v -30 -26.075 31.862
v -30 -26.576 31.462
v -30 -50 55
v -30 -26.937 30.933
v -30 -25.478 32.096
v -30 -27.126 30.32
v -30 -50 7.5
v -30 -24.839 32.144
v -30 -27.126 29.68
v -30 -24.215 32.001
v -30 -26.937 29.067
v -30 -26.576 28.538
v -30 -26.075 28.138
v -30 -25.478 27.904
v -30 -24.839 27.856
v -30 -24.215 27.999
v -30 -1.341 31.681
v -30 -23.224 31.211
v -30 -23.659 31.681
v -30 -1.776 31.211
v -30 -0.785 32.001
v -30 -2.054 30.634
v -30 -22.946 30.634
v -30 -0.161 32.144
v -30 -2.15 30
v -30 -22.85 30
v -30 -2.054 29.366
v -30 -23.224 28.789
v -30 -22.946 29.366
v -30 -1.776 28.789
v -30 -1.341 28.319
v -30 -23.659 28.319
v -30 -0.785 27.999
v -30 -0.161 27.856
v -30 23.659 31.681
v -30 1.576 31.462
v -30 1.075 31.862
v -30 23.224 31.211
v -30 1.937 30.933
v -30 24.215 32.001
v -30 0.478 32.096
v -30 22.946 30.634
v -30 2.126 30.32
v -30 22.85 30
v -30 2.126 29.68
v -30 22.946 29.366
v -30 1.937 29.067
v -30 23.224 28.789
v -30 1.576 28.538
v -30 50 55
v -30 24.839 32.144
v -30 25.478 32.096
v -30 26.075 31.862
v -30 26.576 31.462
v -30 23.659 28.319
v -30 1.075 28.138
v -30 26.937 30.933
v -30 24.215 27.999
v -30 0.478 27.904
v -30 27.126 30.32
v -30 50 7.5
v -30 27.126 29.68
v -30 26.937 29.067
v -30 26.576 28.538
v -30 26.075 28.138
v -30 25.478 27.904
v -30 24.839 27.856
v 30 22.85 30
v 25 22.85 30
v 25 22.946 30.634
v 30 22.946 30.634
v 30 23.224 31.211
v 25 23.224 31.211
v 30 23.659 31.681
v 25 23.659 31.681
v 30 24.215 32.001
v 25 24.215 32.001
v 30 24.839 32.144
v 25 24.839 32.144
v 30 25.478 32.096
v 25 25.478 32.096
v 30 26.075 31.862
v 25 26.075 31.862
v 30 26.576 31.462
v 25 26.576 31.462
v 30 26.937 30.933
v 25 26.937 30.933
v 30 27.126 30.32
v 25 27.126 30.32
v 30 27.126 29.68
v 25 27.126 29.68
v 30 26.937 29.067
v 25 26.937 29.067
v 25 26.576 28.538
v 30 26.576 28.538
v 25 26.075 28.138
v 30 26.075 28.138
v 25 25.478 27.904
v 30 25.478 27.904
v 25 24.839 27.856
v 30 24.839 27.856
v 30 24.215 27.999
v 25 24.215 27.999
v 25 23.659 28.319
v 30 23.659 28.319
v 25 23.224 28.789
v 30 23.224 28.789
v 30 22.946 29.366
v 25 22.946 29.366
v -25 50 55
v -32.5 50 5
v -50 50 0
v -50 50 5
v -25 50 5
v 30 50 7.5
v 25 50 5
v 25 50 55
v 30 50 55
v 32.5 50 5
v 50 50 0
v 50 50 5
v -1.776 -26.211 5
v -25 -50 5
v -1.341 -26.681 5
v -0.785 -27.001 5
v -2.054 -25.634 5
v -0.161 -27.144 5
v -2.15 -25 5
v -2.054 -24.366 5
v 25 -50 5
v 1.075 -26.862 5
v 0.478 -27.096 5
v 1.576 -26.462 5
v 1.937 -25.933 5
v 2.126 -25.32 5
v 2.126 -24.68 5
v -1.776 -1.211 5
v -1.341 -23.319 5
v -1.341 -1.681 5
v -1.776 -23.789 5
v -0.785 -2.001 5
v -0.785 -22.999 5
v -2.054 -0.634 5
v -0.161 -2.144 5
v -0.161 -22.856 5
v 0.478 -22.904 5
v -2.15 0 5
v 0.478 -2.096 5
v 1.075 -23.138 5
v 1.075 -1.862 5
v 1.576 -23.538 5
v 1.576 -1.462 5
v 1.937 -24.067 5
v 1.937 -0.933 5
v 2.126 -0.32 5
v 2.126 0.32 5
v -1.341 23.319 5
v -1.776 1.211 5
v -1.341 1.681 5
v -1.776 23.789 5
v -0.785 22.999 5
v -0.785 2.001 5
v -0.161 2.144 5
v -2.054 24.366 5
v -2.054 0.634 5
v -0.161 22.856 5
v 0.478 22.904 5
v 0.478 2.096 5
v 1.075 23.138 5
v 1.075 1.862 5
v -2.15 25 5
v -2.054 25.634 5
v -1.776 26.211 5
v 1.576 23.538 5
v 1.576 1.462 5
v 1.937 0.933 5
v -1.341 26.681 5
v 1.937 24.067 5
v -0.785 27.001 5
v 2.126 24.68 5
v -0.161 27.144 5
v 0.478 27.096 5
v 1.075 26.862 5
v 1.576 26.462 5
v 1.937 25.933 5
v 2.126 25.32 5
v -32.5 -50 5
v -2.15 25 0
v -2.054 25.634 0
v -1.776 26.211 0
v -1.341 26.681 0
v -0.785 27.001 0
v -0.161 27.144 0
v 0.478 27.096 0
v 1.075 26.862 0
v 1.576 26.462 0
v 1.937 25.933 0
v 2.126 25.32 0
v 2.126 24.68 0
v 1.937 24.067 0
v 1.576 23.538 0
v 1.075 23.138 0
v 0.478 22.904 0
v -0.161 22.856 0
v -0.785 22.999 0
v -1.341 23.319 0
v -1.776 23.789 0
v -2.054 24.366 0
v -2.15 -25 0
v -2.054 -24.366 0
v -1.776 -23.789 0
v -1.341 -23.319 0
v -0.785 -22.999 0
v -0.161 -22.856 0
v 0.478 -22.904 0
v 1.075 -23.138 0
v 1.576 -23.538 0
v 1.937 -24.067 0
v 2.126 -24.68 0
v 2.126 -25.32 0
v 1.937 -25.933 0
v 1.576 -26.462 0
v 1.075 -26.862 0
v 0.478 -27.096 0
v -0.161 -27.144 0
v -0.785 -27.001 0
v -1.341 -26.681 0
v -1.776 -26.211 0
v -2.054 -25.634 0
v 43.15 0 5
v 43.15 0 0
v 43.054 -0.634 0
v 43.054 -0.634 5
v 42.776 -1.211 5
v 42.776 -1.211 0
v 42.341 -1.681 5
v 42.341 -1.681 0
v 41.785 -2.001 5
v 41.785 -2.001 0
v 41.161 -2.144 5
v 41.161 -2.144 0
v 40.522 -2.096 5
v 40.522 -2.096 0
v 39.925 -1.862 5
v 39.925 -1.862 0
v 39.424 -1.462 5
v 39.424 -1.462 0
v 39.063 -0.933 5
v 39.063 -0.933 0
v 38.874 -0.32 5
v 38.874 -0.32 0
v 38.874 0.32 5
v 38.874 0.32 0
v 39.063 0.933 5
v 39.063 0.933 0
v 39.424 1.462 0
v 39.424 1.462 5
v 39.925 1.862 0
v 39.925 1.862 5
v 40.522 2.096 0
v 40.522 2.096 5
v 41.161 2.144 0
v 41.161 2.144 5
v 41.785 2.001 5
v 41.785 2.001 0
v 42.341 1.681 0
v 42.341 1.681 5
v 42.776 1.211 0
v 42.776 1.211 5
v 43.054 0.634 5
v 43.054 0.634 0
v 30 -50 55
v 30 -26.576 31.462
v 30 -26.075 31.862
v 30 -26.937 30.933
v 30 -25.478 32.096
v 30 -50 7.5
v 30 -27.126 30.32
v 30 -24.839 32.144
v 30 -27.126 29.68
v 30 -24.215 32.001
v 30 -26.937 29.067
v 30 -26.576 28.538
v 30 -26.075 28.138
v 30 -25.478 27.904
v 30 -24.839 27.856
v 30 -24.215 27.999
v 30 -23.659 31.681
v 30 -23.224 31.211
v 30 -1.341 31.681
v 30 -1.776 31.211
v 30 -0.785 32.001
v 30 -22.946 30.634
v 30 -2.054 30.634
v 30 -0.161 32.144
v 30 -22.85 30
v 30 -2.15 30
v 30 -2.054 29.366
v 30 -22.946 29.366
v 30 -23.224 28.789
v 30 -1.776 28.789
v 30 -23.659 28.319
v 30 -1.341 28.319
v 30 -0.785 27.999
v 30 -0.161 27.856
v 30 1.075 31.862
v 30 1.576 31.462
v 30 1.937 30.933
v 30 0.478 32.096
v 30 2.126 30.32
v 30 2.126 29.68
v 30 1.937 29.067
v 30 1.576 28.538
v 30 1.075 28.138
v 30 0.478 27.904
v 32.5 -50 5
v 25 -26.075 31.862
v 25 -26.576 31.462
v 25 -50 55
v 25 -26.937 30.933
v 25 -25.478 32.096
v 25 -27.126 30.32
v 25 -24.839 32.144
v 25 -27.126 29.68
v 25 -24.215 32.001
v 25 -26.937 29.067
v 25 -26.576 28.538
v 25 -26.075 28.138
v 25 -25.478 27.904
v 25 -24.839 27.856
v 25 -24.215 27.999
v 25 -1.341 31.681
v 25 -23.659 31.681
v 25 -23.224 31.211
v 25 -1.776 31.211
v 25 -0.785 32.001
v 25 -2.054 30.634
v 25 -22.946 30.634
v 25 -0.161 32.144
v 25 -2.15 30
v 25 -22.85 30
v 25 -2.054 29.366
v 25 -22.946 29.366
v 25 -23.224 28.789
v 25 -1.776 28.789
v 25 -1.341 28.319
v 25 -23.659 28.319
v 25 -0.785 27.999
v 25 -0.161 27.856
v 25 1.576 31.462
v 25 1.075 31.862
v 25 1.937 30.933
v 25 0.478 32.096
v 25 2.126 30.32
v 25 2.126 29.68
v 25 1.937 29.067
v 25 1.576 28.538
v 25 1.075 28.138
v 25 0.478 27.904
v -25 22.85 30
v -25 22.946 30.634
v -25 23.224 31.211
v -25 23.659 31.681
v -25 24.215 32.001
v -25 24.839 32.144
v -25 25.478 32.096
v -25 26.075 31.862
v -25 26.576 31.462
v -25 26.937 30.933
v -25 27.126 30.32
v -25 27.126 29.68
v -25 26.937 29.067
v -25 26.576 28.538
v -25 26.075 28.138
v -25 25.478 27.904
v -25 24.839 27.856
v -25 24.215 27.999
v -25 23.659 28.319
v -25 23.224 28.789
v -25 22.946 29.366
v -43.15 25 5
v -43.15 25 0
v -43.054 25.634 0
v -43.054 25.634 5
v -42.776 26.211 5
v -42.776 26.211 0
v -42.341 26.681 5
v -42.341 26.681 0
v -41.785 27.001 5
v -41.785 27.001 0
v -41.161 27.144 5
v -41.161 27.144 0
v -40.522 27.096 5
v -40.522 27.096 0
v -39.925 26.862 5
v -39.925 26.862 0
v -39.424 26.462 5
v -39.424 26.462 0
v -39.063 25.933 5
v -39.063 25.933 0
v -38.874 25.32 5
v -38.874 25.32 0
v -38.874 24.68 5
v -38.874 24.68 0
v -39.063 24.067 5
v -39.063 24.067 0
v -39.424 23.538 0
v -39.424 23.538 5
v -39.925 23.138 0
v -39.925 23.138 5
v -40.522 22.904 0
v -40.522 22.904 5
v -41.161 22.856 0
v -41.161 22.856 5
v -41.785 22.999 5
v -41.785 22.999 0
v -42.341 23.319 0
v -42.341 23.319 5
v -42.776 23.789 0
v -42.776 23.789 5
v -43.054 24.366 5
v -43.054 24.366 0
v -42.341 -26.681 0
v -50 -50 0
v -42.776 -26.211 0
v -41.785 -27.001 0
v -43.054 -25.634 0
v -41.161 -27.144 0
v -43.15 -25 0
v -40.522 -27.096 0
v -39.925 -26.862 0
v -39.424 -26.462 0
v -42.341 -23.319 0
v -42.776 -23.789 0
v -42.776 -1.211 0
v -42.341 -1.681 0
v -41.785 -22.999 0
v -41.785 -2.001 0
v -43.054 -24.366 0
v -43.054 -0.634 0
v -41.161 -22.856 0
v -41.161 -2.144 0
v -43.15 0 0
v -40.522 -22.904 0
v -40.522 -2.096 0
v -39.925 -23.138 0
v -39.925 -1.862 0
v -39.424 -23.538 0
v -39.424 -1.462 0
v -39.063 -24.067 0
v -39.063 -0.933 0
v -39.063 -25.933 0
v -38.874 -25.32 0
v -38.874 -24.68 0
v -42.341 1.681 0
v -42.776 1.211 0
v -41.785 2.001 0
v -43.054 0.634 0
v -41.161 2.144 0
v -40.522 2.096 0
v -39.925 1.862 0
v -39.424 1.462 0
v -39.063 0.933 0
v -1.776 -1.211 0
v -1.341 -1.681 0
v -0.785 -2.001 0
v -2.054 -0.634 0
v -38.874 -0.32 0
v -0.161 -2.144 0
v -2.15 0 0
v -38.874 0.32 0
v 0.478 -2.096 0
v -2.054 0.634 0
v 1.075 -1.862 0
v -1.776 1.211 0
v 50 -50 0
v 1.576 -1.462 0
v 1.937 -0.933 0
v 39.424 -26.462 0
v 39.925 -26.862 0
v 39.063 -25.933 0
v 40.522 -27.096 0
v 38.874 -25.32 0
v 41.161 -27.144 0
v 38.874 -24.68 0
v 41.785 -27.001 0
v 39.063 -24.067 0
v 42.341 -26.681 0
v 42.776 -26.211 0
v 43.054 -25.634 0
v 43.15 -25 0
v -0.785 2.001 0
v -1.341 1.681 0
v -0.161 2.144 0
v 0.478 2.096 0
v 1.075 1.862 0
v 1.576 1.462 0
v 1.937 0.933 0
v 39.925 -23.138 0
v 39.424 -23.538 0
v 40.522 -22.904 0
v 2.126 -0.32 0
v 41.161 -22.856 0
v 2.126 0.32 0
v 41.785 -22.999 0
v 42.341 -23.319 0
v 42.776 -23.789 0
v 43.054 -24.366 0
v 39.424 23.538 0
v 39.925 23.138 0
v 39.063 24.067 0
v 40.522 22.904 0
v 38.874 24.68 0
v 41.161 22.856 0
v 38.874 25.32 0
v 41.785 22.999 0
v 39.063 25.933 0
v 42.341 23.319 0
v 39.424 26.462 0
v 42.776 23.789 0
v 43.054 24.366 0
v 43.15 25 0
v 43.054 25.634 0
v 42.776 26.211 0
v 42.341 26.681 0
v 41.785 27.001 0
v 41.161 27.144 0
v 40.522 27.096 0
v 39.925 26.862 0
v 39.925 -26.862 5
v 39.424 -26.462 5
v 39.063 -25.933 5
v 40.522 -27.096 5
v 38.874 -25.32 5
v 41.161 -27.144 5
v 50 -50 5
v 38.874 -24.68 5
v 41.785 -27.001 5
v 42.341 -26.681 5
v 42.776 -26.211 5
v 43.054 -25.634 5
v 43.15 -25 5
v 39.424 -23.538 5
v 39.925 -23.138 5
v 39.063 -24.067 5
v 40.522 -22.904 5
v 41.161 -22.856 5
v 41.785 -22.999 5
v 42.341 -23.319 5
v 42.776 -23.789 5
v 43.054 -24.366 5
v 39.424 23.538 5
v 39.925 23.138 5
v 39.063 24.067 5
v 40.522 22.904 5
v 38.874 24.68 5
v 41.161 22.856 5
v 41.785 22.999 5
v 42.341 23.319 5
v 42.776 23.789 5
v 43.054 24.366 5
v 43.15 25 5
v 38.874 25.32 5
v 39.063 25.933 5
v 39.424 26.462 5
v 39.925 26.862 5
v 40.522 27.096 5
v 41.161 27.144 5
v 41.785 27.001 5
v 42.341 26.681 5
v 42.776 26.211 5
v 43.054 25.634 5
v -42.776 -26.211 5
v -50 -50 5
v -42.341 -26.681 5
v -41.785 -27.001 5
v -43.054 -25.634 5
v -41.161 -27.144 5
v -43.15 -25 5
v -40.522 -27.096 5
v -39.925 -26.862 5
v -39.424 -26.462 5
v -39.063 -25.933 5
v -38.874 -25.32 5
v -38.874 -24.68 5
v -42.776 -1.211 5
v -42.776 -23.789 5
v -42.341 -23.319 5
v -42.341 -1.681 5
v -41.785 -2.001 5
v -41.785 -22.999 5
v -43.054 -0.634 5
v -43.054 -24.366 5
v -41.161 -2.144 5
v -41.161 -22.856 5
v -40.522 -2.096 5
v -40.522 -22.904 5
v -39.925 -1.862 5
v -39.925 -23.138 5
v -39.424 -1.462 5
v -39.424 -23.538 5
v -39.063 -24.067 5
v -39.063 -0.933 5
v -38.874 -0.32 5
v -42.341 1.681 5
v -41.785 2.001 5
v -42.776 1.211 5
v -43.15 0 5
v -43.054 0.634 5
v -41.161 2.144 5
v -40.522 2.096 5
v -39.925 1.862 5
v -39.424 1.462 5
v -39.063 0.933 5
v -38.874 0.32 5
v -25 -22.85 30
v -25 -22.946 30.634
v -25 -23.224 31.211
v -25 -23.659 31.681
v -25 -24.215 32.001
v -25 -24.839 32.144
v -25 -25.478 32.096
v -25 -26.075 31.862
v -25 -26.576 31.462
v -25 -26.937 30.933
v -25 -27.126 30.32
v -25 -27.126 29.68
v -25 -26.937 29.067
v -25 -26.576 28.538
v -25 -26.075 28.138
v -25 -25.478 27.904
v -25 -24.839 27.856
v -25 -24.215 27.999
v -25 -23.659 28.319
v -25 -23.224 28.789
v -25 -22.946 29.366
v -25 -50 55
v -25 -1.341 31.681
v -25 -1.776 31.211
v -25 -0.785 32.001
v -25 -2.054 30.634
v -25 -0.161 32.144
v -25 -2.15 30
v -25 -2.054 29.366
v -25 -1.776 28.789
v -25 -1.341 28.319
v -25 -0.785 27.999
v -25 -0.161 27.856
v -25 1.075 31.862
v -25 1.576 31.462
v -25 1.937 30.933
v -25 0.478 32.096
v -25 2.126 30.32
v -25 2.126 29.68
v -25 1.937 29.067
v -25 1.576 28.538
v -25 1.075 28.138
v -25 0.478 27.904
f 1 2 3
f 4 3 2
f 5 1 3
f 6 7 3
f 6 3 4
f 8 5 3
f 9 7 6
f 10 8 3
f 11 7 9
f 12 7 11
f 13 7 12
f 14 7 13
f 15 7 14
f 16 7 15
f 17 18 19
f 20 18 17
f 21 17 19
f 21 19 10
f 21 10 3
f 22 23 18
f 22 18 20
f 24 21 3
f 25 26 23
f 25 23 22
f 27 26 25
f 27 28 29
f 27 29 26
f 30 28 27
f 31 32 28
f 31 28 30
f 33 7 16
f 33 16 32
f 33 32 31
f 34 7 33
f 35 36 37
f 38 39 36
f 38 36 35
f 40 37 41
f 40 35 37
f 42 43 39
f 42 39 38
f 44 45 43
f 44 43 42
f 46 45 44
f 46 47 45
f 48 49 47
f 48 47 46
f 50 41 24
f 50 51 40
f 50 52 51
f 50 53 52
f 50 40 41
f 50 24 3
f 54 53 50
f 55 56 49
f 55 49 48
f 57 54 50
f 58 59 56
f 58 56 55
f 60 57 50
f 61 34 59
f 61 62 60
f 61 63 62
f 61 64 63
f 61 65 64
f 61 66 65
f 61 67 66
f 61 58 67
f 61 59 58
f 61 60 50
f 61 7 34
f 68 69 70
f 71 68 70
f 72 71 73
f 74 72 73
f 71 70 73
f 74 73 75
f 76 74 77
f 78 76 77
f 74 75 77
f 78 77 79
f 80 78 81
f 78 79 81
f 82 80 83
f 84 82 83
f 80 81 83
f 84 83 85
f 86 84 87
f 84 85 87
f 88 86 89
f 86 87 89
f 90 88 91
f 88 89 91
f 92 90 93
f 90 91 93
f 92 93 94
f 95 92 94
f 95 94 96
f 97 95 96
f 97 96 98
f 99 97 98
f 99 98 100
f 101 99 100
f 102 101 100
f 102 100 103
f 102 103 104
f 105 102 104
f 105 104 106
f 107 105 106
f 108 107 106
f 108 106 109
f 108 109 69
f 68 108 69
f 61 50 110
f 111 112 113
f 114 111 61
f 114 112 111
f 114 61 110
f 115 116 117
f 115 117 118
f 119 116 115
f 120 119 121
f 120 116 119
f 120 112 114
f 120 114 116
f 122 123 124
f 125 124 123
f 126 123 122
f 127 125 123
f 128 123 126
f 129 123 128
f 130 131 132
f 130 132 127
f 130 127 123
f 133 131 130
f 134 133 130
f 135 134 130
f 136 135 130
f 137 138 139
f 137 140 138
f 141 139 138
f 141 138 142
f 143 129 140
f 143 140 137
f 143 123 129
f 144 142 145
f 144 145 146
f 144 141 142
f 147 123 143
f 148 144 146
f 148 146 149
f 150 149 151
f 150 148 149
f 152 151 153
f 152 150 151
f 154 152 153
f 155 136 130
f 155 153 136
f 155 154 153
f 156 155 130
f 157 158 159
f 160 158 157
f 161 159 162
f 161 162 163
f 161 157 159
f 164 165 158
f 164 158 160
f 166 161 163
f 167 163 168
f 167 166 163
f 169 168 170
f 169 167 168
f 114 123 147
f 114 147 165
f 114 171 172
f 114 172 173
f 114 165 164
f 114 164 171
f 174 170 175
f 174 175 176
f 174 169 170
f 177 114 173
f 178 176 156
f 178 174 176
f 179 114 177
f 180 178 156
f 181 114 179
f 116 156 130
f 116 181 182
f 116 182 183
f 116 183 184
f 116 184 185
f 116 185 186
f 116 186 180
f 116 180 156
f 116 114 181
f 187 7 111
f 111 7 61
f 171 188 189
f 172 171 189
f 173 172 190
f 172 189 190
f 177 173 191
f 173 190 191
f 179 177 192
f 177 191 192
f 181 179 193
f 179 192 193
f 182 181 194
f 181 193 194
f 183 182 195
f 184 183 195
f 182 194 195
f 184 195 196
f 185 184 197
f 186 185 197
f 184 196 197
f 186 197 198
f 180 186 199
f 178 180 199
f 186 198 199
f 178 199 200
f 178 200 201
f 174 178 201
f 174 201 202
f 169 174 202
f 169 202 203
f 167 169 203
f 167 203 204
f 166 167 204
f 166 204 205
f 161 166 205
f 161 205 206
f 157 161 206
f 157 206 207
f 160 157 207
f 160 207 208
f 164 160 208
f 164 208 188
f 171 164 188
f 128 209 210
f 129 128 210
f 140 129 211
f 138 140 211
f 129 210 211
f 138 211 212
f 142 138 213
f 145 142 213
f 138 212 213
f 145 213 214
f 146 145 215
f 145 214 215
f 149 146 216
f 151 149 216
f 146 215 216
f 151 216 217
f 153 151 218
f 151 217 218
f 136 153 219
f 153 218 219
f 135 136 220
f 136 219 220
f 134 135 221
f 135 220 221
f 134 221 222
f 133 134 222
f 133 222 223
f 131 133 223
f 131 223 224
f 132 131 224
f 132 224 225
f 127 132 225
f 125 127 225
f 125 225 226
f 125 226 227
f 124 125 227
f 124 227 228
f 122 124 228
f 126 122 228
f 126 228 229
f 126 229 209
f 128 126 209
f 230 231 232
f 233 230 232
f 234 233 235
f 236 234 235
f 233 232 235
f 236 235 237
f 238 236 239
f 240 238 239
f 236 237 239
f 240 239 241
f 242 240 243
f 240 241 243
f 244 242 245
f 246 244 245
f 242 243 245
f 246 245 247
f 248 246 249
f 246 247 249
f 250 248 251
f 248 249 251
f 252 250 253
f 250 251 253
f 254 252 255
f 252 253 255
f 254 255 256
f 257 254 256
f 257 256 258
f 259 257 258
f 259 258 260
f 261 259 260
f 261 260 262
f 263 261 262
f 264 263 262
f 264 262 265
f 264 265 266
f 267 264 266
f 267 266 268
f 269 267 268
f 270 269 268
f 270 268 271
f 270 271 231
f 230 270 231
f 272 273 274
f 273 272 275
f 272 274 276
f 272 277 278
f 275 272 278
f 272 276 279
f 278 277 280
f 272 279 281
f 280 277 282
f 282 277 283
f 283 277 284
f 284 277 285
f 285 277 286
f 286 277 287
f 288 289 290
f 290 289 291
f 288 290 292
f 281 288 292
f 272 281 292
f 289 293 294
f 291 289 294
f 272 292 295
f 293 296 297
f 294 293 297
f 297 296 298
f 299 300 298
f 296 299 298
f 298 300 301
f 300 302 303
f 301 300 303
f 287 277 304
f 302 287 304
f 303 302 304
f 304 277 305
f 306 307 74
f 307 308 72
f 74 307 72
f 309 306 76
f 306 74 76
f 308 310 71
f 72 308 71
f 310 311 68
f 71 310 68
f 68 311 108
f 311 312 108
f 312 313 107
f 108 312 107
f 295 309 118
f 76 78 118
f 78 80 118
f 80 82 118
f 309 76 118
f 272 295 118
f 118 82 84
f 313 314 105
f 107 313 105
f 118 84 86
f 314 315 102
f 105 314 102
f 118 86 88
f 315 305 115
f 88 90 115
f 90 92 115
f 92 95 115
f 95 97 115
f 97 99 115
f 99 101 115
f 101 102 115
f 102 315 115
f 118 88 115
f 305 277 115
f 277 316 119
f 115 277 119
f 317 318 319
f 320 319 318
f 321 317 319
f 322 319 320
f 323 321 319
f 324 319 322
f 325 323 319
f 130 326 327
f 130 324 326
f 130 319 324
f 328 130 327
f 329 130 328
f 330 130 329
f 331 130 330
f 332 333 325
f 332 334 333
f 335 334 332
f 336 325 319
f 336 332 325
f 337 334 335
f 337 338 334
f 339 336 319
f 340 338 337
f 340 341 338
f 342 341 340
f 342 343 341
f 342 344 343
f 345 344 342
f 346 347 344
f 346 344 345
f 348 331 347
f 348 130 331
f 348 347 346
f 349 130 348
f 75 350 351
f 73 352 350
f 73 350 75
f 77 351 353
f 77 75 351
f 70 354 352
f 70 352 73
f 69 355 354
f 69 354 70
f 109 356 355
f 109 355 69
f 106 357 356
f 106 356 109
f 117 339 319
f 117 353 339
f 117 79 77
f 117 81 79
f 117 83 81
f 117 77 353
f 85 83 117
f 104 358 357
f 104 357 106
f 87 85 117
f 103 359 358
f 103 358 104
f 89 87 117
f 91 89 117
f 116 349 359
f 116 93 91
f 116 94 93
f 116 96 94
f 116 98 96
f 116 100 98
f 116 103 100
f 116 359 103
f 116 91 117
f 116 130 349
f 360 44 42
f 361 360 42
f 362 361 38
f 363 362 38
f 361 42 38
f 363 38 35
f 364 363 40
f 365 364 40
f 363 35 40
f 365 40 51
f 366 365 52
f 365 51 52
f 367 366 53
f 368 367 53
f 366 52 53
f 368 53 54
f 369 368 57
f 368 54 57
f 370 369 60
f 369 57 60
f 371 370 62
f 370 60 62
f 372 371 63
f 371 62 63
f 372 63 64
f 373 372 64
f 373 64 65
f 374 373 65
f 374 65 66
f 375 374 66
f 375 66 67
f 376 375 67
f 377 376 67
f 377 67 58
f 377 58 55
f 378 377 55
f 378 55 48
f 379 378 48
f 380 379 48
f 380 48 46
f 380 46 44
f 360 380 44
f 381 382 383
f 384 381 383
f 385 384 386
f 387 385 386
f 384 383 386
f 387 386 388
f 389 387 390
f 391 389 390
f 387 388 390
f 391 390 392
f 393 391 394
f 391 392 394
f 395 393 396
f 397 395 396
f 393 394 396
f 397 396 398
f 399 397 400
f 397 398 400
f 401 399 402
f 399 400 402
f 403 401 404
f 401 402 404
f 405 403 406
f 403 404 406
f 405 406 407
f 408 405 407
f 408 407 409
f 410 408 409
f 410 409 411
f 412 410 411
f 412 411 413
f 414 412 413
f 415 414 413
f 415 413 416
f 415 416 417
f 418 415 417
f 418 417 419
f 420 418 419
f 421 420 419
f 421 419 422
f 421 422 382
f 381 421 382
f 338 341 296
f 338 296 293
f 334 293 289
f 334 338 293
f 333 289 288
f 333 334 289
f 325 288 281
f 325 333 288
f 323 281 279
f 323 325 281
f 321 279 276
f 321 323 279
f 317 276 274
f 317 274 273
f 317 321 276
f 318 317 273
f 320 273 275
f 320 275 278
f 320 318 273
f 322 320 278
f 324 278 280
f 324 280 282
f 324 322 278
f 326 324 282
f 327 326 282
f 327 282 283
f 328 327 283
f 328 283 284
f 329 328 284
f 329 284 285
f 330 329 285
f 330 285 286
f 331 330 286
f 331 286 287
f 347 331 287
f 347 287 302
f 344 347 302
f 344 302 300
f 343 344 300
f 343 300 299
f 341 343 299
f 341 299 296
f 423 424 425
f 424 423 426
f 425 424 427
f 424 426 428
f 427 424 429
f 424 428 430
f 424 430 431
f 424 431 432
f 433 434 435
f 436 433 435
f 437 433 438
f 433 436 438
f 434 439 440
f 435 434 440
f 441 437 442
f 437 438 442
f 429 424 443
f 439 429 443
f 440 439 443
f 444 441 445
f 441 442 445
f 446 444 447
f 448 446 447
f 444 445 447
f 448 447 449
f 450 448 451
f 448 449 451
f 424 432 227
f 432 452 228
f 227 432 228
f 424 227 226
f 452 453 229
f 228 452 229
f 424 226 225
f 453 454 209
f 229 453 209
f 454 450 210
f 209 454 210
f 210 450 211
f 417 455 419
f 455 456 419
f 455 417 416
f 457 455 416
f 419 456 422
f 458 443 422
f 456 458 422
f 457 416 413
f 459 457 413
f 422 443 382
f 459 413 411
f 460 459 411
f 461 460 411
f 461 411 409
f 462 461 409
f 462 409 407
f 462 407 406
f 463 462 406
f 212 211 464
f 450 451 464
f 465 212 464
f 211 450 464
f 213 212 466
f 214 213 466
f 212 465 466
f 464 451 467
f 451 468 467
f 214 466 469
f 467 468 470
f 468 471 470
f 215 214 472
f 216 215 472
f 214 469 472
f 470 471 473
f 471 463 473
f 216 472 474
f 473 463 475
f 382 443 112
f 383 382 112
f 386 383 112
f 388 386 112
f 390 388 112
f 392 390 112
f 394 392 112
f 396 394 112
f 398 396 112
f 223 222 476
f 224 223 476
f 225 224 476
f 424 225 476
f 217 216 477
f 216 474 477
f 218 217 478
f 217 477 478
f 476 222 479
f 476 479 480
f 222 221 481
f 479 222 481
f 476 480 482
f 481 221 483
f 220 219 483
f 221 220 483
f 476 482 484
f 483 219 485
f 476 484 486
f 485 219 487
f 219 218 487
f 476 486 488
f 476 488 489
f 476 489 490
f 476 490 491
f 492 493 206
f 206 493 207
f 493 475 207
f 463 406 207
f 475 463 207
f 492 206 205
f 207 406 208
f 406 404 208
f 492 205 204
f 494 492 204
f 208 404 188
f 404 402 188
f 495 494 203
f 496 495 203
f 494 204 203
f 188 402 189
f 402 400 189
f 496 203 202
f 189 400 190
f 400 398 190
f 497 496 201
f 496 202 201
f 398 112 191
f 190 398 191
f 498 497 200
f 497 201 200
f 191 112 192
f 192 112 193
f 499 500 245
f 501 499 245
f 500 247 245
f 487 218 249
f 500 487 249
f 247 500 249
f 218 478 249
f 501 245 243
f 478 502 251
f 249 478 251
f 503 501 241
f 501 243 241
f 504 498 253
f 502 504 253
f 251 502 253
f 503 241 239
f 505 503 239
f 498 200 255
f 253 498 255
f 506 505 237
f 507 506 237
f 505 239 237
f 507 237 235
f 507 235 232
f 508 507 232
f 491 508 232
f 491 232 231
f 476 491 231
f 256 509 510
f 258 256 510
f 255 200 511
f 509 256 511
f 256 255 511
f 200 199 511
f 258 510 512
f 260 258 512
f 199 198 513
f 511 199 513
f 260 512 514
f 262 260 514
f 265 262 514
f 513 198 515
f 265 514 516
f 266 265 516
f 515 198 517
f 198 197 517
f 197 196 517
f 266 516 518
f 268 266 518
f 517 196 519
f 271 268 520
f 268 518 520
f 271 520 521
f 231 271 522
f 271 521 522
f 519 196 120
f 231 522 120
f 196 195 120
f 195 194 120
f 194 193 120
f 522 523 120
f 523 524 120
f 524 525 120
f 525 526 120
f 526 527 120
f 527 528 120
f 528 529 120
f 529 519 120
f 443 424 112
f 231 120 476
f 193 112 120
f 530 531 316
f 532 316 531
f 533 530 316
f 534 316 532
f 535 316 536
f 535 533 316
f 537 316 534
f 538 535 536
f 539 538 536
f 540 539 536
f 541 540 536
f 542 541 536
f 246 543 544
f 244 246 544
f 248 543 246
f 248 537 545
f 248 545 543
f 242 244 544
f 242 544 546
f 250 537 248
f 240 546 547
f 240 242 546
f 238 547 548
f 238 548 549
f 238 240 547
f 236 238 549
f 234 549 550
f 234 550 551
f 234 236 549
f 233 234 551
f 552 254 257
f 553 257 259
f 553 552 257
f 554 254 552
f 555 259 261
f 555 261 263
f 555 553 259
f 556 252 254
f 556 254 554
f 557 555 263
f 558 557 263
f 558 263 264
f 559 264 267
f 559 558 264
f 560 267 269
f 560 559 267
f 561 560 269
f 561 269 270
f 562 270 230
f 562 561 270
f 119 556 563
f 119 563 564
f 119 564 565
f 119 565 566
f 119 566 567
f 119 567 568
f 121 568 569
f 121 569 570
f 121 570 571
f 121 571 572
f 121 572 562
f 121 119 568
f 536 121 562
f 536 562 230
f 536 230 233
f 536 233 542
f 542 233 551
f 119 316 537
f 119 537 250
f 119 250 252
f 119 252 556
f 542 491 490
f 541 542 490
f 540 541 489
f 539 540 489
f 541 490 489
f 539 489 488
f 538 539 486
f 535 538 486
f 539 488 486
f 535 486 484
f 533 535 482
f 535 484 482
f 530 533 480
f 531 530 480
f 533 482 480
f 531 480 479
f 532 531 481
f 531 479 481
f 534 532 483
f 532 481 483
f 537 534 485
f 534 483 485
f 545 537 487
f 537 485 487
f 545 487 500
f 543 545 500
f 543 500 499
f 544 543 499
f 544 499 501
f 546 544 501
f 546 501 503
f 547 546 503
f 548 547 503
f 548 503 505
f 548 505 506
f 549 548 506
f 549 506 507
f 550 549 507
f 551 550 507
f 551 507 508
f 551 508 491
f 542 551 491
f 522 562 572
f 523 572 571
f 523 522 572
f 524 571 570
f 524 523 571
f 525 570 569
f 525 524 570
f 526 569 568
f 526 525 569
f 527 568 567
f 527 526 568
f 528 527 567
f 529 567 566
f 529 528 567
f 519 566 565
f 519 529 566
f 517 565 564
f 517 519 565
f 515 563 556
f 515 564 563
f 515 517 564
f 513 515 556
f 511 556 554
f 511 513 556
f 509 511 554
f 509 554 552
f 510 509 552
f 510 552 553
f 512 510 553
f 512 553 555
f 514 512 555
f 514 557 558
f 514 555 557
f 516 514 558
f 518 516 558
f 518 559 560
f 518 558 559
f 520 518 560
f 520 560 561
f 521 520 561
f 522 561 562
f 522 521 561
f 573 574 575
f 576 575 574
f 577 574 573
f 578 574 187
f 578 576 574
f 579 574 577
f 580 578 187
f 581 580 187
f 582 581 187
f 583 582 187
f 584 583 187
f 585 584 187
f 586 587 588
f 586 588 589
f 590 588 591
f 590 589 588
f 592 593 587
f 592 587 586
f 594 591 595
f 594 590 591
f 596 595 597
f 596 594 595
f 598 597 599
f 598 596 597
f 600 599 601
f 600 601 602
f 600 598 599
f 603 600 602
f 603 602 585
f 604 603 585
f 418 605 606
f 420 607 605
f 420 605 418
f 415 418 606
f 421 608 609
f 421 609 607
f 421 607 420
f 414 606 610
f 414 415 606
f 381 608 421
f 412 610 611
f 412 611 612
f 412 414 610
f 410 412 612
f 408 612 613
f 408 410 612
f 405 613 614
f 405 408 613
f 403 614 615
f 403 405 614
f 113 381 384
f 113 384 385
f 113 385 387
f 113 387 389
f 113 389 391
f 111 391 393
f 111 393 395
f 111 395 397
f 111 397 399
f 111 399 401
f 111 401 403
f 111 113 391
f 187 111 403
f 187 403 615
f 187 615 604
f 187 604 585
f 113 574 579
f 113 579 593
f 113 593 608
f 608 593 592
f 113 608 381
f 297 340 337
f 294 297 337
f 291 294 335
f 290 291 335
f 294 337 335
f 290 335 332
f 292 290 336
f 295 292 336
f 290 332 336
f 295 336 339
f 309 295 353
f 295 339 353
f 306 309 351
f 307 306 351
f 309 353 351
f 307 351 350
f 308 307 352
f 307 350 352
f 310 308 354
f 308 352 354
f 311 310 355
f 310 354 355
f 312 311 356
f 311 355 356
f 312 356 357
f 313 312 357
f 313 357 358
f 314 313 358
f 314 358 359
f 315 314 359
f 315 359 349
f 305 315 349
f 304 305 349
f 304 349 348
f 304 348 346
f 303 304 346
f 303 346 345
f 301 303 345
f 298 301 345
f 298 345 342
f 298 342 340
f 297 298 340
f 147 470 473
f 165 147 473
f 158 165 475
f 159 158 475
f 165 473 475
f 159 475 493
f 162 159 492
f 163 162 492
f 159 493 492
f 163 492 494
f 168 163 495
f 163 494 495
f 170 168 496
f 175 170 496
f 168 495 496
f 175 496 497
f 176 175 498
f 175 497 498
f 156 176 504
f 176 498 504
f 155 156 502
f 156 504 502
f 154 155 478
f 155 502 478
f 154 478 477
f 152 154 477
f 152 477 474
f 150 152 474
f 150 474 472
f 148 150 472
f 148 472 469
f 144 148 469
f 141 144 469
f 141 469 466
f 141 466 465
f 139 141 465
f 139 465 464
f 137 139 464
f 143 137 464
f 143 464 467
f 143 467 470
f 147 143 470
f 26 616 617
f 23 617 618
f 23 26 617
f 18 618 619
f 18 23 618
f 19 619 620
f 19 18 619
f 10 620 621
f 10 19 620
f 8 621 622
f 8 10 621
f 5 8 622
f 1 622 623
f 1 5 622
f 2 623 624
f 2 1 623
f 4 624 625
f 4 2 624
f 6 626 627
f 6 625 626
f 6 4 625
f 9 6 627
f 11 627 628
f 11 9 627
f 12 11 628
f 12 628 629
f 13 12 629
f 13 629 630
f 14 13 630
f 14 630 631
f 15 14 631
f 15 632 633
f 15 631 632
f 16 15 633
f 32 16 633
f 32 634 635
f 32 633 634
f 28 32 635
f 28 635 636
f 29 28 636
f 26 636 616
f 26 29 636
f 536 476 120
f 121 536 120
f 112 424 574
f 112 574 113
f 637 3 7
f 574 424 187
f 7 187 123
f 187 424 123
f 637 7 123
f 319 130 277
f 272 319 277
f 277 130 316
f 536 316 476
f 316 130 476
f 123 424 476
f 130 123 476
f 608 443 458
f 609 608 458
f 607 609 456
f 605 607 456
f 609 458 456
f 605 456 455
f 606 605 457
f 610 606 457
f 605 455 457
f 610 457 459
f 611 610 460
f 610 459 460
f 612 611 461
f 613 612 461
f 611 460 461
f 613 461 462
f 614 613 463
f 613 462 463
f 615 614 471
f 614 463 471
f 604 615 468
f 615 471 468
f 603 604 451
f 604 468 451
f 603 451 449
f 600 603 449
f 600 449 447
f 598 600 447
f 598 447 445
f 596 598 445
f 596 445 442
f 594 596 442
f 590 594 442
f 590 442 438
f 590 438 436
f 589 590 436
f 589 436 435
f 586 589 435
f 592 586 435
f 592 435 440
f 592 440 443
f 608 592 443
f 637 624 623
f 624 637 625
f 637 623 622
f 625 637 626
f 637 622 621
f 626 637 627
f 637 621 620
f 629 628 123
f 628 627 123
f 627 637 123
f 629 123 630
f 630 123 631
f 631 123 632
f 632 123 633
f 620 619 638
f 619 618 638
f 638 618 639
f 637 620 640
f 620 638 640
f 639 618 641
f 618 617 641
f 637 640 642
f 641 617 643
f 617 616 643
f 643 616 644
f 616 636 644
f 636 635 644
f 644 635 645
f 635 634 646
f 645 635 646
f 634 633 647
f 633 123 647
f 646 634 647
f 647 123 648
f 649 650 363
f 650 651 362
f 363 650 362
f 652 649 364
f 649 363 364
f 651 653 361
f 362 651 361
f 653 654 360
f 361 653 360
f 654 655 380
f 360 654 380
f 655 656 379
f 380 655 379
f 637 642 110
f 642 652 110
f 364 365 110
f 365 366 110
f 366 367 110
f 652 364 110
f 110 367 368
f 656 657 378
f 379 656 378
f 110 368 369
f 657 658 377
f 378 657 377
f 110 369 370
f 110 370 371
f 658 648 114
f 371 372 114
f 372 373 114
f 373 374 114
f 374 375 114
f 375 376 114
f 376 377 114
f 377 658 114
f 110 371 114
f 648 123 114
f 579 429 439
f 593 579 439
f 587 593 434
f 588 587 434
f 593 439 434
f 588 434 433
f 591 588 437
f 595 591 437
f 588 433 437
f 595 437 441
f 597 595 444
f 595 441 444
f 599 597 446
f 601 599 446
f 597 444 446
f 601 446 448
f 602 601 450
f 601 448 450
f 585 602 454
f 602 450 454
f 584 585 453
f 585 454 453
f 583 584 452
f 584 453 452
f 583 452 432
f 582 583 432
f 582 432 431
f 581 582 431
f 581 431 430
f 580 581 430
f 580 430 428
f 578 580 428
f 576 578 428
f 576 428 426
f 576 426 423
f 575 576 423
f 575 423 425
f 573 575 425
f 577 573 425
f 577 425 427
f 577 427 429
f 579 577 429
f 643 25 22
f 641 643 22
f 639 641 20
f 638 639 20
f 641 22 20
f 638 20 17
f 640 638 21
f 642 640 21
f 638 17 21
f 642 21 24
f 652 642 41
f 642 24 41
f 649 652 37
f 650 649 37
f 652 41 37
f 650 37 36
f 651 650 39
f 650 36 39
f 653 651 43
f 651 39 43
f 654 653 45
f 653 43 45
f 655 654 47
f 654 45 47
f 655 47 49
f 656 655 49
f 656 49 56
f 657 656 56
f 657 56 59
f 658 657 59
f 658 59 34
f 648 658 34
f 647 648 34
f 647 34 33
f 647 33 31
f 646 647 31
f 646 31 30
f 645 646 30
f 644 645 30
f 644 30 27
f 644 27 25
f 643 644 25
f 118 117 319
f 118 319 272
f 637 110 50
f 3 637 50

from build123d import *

# Parameters (mm, degrees)
SKETCH1_W               = 100
SKETCH1_H               = 100
BOSS_EXTRUDE1_DEPTH     = 5
SKETCH2_W               = 5
SKETCH2_H               = 100
BOSS_EXTRUDE2_DEPTH     = 50
SKETCH3_R               = 2.15
CUT_EXTRUDE1_DEPTH      = 10
LPATTERN1_COUNT         = 3
LPATTERN1_PITCH         = 25
MIRROR2_COPY_1_SKETCH_R = 2.15
MIRROR2_COPY_1_DEPTH    = 10
MIRROR2_COPY_2_SKETCH_R = 2.15
MIRROR2_COPY_2_DEPTH    = 10
MIRROR3_COPY_1_SKETCH_R = 2.15
MIRROR3_COPY_1_DEPTH    = 10
MIRROR3_COPY_2_SKETCH_R = 2.15
MIRROR3_COPY_2_DEPTH    = 10
MIRROR3_COPY_3_SKETCH_R = 2.15
MIRROR3_COPY_3_DEPTH    = 10
MIRROR3_COPY_4_SKETCH_R = 2.15
MIRROR3_COPY_4_DEPTH    = 10
CHAMFER1_SIZE           = 2.5
SKETCH7_R               = 2.15
CUT_EXTRUDE2_DEPTH      = 60
SKETCH8_R               = 2.15
CUT_EXTRUDE3_DEPTH      = 60


with BuildPart() as part:
    # Sketch1 → Boss-Extrude1 (new body)
    with BuildSketch(Plane.XY):
        Rectangle(SKETCH1_W, SKETCH1_H)
    extrude(amount=BOSS_EXTRUDE1_DEPTH)

    # Sketch2 → Boss-Extrude2 (add)
    with BuildSketch(Plane.XY.offset(5)):
        with Locations((27.5, 0)):
            Rectangle(SKETCH2_W, SKETCH2_H)
    boss_extrude2 = extrude(amount=BOSS_EXTRUDE2_DEPTH)

    # Sketch3 → Cut-Extrude1 (cut)
    with BuildSketch(Plane(origin=(0, 0, 0), x_dir=(-1, 0, 0), z_dir=(0, 0, -1))):
        with Locations((0, 25)):
            Circle(SKETCH3_R)
    cut_extrude1 = extrude(amount=-CUT_EXTRUDE1_DEPTH, mode=Mode.SUBTRACT)

    # Mirror1: Boss-Extrude2 across plane
    add(boss_extrude2.mirror(Plane(origin=(0, 0, 0), x_dir=(0, 0, 1), z_dir=(1, 0, 0))))

    # LPattern1: Cut-Extrude1 ×3
    with Locations(*[(0, -i * LPATTERN1_PITCH, 0) for i in range(1, LPATTERN1_COUNT)]):
        add(cut_extrude1, mode=Mode.SUBTRACT)

    # Mirror2: Cut-Extrude1 across plane
    add(cut_extrude1.mirror(Plane(origin=(20.5, 0, 0), x_dir=(0, 0, 1), z_dir=(1, 0, 0))), mode=Mode.SUBTRACT)

    # Mirror2 copy 1 sketch → Mirror2 copy 1 (cut)
    with BuildSketch(Plane(origin=(41, -25, 0), x_dir=(1, 0, 0), z_dir=(0, 0, -1))):
        with Locations((0, -25)):
            Circle(MIRROR2_COPY_1_SKETCH_R)
    extrude(amount=-MIRROR2_COPY_1_DEPTH, mode=Mode.SUBTRACT)

    # Mirror2 copy 2 sketch → Mirror2 copy 2 (cut)
    with BuildSketch(Plane(origin=(41, -50, 0), x_dir=(1, 0, 0), z_dir=(0, 0, -1))):
        with Locations((0, -25)):
            Circle(MIRROR2_COPY_2_SKETCH_R)
    extrude(amount=-MIRROR2_COPY_2_DEPTH, mode=Mode.SUBTRACT)

    # Mirror3 copy 1 sketch → Mirror3 copy 1 (cut)
    with BuildSketch(Plane(origin=(-41, 0, 0), x_dir=(-1, 0, 0), z_dir=(0, 0, -1))):
        with Locations((0, 25)):
            Circle(MIRROR3_COPY_1_SKETCH_R)
    extrude(amount=-MIRROR3_COPY_1_DEPTH, mode=Mode.SUBTRACT)

    # Mirror3 copy 2 sketch → Mirror3 copy 2 (cut)
    with BuildSketch(Plane(origin=(-41, -25, 0), x_dir=(-1, 0, 0), z_dir=(0, 0, -1))):
        with Locations((0, 25)):
            Circle(MIRROR3_COPY_2_SKETCH_R)
    extrude(amount=-MIRROR3_COPY_2_DEPTH, mode=Mode.SUBTRACT)

    # Mirror3 copy 3 sketch → Mirror3 copy 3 (cut)
    with BuildSketch(Plane(origin=(-41, -50, 0), x_dir=(-1, 0, 0), z_dir=(0, 0, -1))):
        with Locations((0, 25)):
            Circle(MIRROR3_COPY_3_SKETCH_R)
    extrude(amount=-MIRROR3_COPY_3_DEPTH, mode=Mode.SUBTRACT)

    # Mirror3 copy 4 sketch → Mirror3 copy 4 (cut)
    with BuildSketch(Plane(origin=(0, 0, 0), x_dir=(1, 0, 0), z_dir=(0, 0, -1))):
        with Locations((0, -25)):
            Circle(MIRROR3_COPY_4_SKETCH_R)
    extrude(amount=-MIRROR3_COPY_4_DEPTH, mode=Mode.SUBTRACT)

    # Chamfer1
    chamfer1_edges = [part.edges().sort_by_distance(p)[0] for p in [
        (30, 0, 5),
        (-30, 0, 5),
    ]]
    chamfer(chamfer1_edges, length=CHAMFER1_SIZE)

    # Sketch7 → Cut-Extrude2 (cut)
    with BuildSketch(Plane.ZY.offset(30)):
        with Locations(Location((30, 25, 0), (0, 0, 270))):
            Circle(SKETCH7_R)
    cut_extrude2 = extrude(amount=-CUT_EXTRUDE2_DEPTH, mode=Mode.SUBTRACT)

    # Sketch8 → Cut-Extrude3 (cut)
    with BuildSketch(Plane.ZY.offset(30)):
        with Locations(Location((30, 0, 0), (0, 0, 270))):
            Circle(SKETCH8_R)
        with Locations(Location((30, 25, 0), (0, 0, 270))):
            Circle(SKETCH8_R)
    extrude(amount=-CUT_EXTRUDE3_DEPTH, mode=Mode.SUBTRACT)

    # Mirror4: Cut-Extrude2 across plane
    add(cut_extrude2.mirror(Plane.ZX), mode=Mode.SUBTRACT)


solid = part.part
